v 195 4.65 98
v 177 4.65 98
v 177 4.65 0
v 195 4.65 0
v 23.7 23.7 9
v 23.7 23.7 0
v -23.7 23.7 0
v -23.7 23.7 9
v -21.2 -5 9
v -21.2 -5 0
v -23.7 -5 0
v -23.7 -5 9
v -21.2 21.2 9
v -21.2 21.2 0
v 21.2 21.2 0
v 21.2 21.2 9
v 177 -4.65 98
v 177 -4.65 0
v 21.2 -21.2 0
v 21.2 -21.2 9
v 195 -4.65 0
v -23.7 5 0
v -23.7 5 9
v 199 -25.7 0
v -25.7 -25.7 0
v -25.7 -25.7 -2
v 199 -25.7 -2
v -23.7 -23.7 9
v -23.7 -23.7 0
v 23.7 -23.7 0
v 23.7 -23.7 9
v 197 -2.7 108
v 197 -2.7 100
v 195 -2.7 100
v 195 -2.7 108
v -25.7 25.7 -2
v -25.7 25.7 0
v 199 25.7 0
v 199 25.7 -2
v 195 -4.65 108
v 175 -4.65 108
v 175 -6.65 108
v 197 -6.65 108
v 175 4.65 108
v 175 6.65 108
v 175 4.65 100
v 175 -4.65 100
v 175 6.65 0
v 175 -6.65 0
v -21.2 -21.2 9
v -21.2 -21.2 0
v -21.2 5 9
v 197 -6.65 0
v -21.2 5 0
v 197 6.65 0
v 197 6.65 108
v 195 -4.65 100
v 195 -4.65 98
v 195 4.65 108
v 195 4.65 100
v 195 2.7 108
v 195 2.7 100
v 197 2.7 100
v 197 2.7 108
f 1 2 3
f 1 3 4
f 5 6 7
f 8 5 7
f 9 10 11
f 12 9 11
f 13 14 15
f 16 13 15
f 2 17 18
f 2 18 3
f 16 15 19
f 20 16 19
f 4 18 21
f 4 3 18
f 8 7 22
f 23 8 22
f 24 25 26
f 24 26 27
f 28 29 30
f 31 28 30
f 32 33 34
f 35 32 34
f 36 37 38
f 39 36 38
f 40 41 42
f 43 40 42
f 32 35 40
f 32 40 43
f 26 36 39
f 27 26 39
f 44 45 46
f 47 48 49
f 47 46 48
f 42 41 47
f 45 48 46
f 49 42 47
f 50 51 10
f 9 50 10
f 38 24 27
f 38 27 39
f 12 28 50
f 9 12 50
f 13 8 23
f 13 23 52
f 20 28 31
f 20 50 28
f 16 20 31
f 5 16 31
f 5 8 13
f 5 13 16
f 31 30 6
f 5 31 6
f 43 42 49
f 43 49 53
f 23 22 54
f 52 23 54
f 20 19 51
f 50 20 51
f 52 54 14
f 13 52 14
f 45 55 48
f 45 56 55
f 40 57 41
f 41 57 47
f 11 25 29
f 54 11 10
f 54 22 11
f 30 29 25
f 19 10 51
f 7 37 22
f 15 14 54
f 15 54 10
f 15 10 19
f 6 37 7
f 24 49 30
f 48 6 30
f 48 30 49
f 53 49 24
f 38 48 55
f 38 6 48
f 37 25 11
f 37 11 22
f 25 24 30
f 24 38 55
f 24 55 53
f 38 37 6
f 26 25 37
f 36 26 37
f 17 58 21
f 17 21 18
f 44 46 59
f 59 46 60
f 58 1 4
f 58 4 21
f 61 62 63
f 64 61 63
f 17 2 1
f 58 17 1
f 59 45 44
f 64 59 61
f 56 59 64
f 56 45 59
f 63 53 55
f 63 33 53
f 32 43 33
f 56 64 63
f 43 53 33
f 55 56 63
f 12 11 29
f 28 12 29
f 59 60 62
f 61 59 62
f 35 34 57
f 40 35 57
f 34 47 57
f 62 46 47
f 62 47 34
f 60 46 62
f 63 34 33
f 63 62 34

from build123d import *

# Parameters (mm, degrees)
F1_DEPTH  = 9
F5_W      = 2
F5_H      = 2
F6_DEPTH  = 8
F7_DEPTH  = 2
F5_H_2    = 4.65
F5_H_3    = 2.7
F8_DEPTH  = 100
F9_W      = 224.7
F9_H      = 51.4
F9_W_2    = 220.7
F9_H_2    = 47.4
F10_DEPTH = 2


with BuildPart() as f1:
    # F0 (on Top) → F1 (new body)
    with BuildSketch(Plane.XY):
        Polygon((-23.7, -23.7), (23.7, -23.7), (23.7, 0), (21.2, 0), (21.2, -21.2), (-21.2, -21.2), (-21.2, -5), (-23.7, -5), align=None)
        Polygon((21.2, 0), (23.7, 0), (23.7, 23.7), (-23.7, 23.7), (-23.7, 5), (-21.2, 5), (-21.2, 21.2), (21.2, 21.2), align=None)
    extrude(amount=F1_DEPTH)



with BuildPart() as f6:
    # F5 (on line) → F6 (new body)
    with BuildSketch(Plane.XY.offset(100)):
        Polygon((195, -4.65), (177, -4.65), (177, -6.65), (197, -6.65), (197, -2.7), (195, -2.7), align=None)
        with Locations((176, -5.65)):
            Rectangle(F5_W, F5_H)
    extrude(amount=F6_DEPTH)



with BuildPart() as f6b:
    # F5 (on line) → F6, piece 2 (new body)
    with BuildSketch(Plane.XY.offset(100)):
        Polygon((177, 6.65), (177, 4.65), (195, 4.65), (195, 2.7), (197, 2.7), (197, 6.65), align=None)
        with Locations((176, 5.65)):
            Rectangle(F5_W, F5_H)
    extrude(amount=F6_DEPTH)


with BuildPart() as f6_1:
    add(f6.part)

    add(f6b.part)  # F7 merges F6b
    # F5 (on line) → F7 (join)
    with BuildSketch(Plane.XY.offset(100)):
        Polygon((177, 4.65), (177, 0), (177, -4.65), (195, -4.65), (195, -2.7), (195, 0), (195, 2.7), (195, 4.65), align=None)
    extrude(amount=-F7_DEPTH)

    # F5 (on line) → F8 (join)
    with BuildSketch(Plane.XY.offset(100)):
        Polygon((195, -4.65), (177, -4.65), (177, -6.65), (197, -6.65), (197, -2.7), (195, -2.7), align=None)
        with Locations((176, -5.65)):
            Rectangle(F5_W, F5_H)
        with Locations((176, -2.325)):
            Rectangle(F5_W, F5_H_2)
        with Locations((176, 2.325)):
            Rectangle(F5_W, F5_H_2)
        with Locations((176, 5.65)):
            Rectangle(F5_W, F5_H)
        Polygon((177, 6.65), (177, 4.65), (195, 4.65), (195, 2.7), (197, 2.7), (197, 6.65), align=None)
        with Locations((196, -1.35)):
            Rectangle(F5_W, F5_H_3)
        with Locations((196, 1.35)):
            Rectangle(F5_W, F5_H_3)
    extrude(amount=-F8_DEPTH)


with BuildPart() as f1_1:
    add(f1.part)

    add(f6_1.part)  # F10 merges F6
    # F9 (on Top) → F10 (join)
    with BuildSketch(Plane.XY):
        with Locations((86.65, 0)):
            Rectangle(F9_W, F9_H)
        with Locations((86.65, 0)):
            Rectangle(F9_W_2, F9_H_2, mode=Mode.SUBTRACT)
        with Locations((86.65, 0)):
            Rectangle(F9_W_2, F9_H_2)
    extrude(amount=-F10_DEPTH)


solid = f1_1.part
